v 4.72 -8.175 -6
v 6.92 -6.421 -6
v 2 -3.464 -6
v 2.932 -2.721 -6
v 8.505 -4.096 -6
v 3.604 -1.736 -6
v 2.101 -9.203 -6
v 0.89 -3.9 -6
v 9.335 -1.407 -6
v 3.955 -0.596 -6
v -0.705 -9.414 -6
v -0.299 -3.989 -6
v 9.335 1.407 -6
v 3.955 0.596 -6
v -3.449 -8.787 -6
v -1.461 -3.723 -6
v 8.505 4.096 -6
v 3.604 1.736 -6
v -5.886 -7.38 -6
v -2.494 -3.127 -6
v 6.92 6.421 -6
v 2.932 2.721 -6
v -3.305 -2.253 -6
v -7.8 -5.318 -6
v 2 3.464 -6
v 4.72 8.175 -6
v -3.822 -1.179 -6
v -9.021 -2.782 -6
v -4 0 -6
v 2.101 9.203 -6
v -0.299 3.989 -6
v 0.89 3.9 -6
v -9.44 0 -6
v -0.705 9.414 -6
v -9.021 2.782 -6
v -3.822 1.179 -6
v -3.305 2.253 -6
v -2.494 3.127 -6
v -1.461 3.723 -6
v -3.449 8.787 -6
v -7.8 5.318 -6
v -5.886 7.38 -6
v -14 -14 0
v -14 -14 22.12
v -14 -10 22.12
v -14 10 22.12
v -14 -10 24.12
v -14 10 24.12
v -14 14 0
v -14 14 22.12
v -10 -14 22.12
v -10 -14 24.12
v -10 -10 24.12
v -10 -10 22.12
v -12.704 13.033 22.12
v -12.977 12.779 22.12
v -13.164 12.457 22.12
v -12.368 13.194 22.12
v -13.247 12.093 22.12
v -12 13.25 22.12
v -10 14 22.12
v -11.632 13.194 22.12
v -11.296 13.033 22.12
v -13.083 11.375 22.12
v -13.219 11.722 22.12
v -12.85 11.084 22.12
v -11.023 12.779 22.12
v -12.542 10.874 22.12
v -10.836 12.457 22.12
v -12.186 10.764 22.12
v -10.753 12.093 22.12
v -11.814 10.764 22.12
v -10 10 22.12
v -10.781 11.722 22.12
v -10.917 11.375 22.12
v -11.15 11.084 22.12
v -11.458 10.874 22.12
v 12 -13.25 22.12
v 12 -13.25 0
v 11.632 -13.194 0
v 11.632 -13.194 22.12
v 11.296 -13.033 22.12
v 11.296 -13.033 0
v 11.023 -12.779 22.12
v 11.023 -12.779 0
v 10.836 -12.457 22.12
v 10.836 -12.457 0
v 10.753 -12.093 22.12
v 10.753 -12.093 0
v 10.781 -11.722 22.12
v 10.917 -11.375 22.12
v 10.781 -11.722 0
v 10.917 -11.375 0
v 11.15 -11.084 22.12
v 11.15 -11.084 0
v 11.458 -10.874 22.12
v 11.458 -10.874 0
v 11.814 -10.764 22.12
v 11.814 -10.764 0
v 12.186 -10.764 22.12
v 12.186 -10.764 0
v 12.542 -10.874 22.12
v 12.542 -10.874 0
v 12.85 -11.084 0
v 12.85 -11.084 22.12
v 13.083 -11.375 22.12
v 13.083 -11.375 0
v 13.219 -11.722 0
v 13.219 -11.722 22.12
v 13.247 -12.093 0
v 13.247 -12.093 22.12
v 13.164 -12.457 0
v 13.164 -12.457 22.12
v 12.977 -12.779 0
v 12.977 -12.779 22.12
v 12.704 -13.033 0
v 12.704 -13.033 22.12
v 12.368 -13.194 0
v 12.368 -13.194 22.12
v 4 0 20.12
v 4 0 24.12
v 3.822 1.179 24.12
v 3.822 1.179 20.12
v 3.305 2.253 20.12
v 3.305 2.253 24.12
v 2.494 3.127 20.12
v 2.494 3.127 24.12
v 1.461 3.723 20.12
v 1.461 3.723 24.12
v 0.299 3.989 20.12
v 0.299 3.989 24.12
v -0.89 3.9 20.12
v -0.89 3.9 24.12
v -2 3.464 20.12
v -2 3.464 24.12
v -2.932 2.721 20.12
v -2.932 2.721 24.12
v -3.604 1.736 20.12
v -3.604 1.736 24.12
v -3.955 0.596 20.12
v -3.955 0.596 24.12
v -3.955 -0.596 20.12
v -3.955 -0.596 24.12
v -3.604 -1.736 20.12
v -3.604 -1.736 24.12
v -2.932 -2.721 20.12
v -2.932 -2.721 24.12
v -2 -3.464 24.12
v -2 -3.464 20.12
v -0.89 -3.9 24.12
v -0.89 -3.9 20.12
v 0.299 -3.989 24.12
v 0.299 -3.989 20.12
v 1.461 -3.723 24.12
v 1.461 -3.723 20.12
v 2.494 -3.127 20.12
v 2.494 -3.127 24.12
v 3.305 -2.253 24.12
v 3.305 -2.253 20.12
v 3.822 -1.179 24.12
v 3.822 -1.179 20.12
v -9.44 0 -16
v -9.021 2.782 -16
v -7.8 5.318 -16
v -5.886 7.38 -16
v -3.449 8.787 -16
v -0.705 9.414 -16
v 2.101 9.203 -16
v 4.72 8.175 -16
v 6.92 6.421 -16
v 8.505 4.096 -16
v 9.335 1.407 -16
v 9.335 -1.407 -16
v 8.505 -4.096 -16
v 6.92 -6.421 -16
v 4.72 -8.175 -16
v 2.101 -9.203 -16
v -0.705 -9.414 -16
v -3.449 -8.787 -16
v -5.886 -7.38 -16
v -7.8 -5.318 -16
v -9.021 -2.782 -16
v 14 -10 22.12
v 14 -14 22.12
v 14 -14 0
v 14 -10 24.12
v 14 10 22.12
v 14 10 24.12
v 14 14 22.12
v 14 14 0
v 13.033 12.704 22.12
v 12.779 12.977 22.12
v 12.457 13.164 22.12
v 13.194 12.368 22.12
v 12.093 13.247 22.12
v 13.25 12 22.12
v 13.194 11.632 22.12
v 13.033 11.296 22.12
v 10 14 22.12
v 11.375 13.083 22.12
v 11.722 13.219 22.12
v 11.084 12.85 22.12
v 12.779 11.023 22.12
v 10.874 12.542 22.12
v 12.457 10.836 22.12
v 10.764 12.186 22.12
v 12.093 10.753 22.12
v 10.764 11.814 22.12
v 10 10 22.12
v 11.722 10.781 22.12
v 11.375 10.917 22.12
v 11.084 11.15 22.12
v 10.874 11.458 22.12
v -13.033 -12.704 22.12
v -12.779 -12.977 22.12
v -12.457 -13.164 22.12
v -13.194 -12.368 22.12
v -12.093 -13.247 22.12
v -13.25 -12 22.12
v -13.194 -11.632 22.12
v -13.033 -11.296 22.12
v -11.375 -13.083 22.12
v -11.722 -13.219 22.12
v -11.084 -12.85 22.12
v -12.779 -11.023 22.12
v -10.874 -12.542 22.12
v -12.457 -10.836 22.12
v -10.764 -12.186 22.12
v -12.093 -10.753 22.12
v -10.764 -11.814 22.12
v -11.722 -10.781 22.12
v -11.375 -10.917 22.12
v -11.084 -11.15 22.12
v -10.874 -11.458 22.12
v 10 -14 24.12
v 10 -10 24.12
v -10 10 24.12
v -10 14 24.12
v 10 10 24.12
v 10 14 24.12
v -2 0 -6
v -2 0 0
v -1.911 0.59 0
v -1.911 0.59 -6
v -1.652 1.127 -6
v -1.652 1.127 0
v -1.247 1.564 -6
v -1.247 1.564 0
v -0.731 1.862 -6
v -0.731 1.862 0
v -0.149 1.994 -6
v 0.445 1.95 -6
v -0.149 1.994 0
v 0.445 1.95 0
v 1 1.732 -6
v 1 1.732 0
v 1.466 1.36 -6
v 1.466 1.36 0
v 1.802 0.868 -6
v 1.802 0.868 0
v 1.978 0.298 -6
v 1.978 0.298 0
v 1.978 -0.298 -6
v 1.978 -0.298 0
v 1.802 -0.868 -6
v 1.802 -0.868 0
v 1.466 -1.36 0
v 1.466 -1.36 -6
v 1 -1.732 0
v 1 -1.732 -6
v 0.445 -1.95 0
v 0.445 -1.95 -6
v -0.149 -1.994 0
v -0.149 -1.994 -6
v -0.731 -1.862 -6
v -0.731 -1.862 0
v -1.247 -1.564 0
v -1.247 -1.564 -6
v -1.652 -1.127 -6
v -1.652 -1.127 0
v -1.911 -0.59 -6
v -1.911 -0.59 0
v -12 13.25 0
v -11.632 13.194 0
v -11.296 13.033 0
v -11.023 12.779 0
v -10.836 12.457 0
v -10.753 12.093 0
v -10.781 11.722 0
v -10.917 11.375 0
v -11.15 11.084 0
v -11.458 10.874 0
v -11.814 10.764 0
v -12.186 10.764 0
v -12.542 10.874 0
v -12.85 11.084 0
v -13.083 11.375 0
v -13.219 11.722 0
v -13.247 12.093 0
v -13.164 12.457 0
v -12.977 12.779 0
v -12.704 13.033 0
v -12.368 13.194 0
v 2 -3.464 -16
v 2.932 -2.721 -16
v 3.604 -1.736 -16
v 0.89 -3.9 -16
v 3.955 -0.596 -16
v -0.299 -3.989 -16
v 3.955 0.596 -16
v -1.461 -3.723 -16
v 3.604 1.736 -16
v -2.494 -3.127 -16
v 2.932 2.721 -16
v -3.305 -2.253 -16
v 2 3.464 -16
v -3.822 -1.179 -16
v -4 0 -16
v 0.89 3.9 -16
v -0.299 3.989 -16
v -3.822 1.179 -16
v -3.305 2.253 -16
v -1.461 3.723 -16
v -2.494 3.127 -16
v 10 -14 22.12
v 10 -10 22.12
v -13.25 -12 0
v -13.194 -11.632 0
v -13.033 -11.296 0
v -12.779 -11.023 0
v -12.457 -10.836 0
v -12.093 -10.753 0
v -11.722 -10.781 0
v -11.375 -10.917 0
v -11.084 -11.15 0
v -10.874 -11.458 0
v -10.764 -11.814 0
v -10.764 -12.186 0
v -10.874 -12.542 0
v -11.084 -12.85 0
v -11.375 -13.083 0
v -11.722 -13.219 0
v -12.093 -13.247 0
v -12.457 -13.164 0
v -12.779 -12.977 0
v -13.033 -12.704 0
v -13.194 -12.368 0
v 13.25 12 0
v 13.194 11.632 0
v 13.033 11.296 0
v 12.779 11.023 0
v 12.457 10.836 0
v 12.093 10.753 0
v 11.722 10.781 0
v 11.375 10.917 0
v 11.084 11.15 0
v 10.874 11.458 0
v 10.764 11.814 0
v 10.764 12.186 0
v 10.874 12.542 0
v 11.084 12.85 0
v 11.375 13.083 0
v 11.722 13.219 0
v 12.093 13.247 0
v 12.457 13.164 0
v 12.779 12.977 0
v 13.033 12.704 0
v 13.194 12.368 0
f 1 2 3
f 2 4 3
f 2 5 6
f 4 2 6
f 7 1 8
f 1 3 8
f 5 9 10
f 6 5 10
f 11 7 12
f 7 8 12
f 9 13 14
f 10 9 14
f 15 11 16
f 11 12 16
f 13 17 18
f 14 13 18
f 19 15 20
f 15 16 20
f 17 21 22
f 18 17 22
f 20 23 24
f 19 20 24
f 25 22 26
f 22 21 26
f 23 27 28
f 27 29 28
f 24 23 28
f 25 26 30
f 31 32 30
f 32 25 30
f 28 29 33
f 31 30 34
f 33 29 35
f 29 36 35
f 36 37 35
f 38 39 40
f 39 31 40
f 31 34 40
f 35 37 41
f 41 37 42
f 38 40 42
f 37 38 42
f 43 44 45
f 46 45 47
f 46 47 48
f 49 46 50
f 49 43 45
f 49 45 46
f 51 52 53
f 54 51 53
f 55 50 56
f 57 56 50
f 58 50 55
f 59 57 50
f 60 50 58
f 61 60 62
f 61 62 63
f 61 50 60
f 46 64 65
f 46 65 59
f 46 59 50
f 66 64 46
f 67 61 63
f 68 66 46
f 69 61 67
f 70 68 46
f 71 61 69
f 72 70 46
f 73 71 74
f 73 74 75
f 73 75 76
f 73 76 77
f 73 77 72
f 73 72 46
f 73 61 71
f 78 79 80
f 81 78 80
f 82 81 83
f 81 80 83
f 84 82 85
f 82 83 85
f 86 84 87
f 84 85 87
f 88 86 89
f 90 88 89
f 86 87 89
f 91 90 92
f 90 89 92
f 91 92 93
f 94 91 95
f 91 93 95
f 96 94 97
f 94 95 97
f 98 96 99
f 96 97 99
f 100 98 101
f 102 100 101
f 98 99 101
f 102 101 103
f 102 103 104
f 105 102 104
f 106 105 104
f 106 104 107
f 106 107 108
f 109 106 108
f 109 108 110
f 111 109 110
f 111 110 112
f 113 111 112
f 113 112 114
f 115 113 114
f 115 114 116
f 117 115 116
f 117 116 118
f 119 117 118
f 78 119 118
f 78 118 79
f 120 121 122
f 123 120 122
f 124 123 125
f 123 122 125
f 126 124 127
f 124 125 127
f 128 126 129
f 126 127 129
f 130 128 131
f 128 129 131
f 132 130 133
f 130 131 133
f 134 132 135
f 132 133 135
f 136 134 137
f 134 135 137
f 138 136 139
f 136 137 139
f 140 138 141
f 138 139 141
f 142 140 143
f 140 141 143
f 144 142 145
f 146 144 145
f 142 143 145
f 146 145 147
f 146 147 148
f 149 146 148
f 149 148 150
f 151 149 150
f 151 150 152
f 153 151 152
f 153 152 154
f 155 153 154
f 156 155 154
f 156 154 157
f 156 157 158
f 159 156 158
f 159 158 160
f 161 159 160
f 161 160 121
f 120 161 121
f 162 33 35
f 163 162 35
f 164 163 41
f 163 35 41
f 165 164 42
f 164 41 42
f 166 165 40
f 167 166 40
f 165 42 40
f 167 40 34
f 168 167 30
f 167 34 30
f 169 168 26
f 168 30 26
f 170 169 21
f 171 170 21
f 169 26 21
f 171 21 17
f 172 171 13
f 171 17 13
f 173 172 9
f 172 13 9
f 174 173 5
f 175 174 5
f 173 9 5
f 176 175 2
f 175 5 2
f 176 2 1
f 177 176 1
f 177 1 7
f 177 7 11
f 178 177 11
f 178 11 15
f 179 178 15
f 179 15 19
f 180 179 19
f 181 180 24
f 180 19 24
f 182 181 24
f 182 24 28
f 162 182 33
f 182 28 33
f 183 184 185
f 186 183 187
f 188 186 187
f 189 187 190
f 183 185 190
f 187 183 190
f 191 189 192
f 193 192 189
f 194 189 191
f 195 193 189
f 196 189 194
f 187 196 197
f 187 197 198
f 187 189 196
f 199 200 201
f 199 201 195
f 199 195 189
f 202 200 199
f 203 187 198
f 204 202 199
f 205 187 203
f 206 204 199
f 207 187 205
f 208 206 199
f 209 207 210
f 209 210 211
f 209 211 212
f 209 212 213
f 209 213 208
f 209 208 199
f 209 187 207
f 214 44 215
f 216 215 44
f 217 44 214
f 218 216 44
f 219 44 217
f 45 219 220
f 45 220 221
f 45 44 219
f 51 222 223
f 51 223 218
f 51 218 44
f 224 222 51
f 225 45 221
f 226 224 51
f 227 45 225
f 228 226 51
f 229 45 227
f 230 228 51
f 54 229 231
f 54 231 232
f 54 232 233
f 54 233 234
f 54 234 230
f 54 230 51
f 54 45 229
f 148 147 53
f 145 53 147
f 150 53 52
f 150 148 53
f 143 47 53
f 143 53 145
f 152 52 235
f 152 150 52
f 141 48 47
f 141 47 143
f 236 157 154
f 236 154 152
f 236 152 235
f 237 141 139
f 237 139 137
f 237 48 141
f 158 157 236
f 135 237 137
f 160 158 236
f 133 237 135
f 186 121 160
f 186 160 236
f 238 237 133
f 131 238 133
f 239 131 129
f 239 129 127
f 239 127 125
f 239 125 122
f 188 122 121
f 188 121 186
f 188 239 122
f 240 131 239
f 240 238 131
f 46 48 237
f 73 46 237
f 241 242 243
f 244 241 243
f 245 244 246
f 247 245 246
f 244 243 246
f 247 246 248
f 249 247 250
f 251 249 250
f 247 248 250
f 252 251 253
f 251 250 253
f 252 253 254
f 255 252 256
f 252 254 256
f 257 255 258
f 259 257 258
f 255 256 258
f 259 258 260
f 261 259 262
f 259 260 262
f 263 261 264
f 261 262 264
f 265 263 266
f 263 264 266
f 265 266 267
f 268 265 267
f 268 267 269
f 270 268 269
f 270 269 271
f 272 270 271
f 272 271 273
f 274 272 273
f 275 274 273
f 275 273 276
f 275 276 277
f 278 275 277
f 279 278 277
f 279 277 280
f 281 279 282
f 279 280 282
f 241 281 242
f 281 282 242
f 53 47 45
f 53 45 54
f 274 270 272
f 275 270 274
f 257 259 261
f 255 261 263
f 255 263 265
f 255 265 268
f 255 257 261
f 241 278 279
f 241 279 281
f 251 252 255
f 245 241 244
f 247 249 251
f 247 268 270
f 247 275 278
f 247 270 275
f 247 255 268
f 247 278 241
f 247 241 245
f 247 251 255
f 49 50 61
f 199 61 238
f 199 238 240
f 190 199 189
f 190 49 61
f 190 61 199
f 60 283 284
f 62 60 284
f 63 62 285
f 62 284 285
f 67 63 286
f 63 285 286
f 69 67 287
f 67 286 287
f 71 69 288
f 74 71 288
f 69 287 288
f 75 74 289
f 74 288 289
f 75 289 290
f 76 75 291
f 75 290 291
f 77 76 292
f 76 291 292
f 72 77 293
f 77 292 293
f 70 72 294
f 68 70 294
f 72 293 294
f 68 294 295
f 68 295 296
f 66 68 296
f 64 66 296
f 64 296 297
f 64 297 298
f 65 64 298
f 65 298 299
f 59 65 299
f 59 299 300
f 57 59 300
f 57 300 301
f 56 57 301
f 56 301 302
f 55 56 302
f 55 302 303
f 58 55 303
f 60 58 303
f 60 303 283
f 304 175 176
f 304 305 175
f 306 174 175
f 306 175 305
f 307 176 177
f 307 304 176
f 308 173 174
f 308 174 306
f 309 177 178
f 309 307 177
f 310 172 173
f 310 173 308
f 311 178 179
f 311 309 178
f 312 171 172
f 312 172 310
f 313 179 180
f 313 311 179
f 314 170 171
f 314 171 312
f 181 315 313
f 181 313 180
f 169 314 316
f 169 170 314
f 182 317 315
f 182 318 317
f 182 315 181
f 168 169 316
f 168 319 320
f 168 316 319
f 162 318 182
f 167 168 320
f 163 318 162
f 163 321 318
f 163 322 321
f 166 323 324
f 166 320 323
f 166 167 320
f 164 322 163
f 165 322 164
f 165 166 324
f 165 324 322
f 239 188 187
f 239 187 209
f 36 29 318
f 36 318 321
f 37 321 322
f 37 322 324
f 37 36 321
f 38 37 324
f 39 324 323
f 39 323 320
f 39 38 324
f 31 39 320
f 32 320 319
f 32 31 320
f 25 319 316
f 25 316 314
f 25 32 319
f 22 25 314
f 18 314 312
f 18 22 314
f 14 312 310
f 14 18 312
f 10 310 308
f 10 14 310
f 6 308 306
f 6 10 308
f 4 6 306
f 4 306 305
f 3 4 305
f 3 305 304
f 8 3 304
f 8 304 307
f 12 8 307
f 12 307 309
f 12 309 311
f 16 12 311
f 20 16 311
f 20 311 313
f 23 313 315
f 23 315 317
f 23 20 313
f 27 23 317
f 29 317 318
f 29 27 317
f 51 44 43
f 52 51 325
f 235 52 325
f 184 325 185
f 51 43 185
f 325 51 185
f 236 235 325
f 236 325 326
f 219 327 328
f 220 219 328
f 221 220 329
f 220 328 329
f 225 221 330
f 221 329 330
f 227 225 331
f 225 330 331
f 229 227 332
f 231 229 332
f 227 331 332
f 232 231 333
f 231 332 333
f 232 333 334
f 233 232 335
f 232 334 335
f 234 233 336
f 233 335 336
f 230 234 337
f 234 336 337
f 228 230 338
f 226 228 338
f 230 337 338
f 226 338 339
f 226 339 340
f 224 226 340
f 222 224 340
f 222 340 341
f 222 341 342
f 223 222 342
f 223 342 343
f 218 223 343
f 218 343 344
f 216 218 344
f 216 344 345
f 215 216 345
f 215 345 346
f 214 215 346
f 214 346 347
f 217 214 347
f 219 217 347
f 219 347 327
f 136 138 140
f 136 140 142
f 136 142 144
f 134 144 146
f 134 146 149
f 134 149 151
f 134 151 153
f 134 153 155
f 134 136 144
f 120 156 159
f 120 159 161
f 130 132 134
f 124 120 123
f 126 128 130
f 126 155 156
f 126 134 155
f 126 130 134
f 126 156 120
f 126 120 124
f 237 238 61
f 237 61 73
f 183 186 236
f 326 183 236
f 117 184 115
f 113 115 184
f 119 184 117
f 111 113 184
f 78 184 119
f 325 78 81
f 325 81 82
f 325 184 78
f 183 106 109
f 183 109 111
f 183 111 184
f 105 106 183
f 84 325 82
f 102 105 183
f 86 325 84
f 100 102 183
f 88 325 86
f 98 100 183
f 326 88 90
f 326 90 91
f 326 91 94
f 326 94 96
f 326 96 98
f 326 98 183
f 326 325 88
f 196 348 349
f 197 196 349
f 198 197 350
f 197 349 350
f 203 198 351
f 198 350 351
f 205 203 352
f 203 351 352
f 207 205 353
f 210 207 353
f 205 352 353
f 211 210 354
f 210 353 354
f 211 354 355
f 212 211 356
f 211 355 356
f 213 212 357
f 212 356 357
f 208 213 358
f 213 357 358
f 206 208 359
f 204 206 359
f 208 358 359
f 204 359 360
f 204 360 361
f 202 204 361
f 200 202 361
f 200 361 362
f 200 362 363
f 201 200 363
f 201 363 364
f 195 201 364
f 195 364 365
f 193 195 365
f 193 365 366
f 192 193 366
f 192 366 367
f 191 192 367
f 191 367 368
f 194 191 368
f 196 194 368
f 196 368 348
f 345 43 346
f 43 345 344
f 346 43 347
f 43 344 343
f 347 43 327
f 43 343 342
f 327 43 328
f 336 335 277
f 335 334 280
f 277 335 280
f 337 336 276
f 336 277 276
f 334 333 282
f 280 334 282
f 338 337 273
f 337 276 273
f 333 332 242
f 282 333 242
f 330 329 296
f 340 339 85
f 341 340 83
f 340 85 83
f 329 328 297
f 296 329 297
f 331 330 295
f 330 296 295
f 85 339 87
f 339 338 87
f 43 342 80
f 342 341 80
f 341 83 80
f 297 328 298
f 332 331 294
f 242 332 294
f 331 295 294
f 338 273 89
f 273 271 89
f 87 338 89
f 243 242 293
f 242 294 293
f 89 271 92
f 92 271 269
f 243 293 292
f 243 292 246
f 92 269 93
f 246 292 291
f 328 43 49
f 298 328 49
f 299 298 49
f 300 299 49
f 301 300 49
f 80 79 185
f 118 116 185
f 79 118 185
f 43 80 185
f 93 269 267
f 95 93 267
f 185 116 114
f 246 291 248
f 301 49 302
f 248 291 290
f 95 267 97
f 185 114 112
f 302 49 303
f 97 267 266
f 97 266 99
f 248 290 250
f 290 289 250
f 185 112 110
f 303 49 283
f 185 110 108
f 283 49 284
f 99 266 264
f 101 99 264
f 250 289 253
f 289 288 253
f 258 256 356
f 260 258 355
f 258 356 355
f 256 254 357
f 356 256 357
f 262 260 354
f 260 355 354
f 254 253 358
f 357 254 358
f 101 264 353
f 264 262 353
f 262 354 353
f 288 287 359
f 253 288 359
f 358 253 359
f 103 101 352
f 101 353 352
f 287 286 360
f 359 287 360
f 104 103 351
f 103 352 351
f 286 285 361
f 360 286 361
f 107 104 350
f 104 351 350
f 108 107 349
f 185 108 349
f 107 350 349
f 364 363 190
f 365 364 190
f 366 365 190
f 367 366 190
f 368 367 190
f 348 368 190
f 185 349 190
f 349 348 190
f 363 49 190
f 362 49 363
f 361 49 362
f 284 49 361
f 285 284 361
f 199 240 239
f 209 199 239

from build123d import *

# Parameters (mm, degrees)
SKETCH_1_W               = 28
SKETCH_1_H               = 28
EXTRUDE_1_DEPTH          = 24.12
SKETCH_2_R               = 4
SKETCH_2_W               = 4
SKETCH_2_H               = 4
CUT_EXTRUDE_1_DEPTH      = 2
SKETCH_3_R               = 4
CUT_EXTRUDE_2_DEPTH      = 2
HOLE_WIZARD_M3_2_D       = 2.5
HOLE_WIZARD_M3_2_DEPTH   = 22.121
PATTERN_CIRCULAR_4_COUNT = 4
PATTERN_CIRCULAR_5_COUNT = 4
SKETCH_7_R               = 2
EXTRUDE_2_DEPTH          = 6
SKETCH_8_R               = 9.44
SKETCH_8_R_2             = 4
EXTRUDE_3_DEPTH          = 10


with BuildPart() as part:
    # 草图1 → 凸台-拉伸1 (new body)
    with BuildSketch(Plane.XY):
        Rectangle(SKETCH_1_W, SKETCH_1_H)
    extrude(amount=EXTRUDE_1_DEPTH)

    # 草图2 → 切除-拉伸1 (cut)
    with BuildSketch(Plane.XY.offset(24.12)):
        Circle(SKETCH_2_R)
        with Locations((-12, -12)):
            Rectangle(SKETCH_2_W, SKETCH_2_H)
    cut_extrude_1 = extrude(amount=-CUT_EXTRUDE_1_DEPTH, mode=Mode.SUBTRACT)

    # 草图3 → 切除-拉伸2 (cut)
    with BuildSketch(Plane.XY.offset(22.12)):
        Circle(SKETCH_3_R)
    extrude(amount=-CUT_EXTRUDE_2_DEPTH, mode=Mode.SUBTRACT)

    # M3 螺纹孔2
    with Locations(Plane(origin=(-12, -12, 22.12), x_dir=(1, 0, 0), z_dir=(0, 0, 1))):
        with Locations((0, 0)):
            hole_wizard_m3_2 = Hole(HOLE_WIZARD_M3_2_D / 2, depth=HOLE_WIZARD_M3_2_DEPTH)

    # 阵列(圆周)4: 切除-拉伸1 ×4 about axis
    pattern_circular_4_axis = Axis((0, 0, 0), (0, 0, 1))
    for i in range(1, PATTERN_CIRCULAR_4_COUNT):
        add(cut_extrude_1.rotate(pattern_circular_4_axis, i * 360 / PATTERN_CIRCULAR_4_COUNT), mode=Mode.SUBTRACT)

    # 阵列(圆周)5: M3 螺纹孔2 ×4 about axis
    pattern_circular_5_axis = Axis((0, 0, 0), (0, 0, 1))
    for i in range(1, PATTERN_CIRCULAR_5_COUNT):
        add(hole_wizard_m3_2.rotate(pattern_circular_5_axis, i * 360 / PATTERN_CIRCULAR_5_COUNT), mode=Mode.SUBTRACT)

    # 草图7 → 凸台-拉伸2 (add)
    with BuildSketch(Plane(origin=(0, 0, 0), x_dir=(-1, 0, 0), z_dir=(0, 0, -1))):
        Circle(SKETCH_7_R)
    extrude(amount=EXTRUDE_2_DEPTH)


with BuildPart() as body_2:
    # 草图8 → 凸台-拉伸3 (new body)
    with BuildSketch(Plane(origin=(0, 0, -6), x_dir=(-1, 0, 0), z_dir=(0, 0, -1))):
        Circle(SKETCH_8_R)
        Circle(SKETCH_8_R_2, mode=Mode.SUBTRACT)
    extrude(amount=EXTRUDE_3_DEPTH)


solid = Compound([part.part, body_2.part])
